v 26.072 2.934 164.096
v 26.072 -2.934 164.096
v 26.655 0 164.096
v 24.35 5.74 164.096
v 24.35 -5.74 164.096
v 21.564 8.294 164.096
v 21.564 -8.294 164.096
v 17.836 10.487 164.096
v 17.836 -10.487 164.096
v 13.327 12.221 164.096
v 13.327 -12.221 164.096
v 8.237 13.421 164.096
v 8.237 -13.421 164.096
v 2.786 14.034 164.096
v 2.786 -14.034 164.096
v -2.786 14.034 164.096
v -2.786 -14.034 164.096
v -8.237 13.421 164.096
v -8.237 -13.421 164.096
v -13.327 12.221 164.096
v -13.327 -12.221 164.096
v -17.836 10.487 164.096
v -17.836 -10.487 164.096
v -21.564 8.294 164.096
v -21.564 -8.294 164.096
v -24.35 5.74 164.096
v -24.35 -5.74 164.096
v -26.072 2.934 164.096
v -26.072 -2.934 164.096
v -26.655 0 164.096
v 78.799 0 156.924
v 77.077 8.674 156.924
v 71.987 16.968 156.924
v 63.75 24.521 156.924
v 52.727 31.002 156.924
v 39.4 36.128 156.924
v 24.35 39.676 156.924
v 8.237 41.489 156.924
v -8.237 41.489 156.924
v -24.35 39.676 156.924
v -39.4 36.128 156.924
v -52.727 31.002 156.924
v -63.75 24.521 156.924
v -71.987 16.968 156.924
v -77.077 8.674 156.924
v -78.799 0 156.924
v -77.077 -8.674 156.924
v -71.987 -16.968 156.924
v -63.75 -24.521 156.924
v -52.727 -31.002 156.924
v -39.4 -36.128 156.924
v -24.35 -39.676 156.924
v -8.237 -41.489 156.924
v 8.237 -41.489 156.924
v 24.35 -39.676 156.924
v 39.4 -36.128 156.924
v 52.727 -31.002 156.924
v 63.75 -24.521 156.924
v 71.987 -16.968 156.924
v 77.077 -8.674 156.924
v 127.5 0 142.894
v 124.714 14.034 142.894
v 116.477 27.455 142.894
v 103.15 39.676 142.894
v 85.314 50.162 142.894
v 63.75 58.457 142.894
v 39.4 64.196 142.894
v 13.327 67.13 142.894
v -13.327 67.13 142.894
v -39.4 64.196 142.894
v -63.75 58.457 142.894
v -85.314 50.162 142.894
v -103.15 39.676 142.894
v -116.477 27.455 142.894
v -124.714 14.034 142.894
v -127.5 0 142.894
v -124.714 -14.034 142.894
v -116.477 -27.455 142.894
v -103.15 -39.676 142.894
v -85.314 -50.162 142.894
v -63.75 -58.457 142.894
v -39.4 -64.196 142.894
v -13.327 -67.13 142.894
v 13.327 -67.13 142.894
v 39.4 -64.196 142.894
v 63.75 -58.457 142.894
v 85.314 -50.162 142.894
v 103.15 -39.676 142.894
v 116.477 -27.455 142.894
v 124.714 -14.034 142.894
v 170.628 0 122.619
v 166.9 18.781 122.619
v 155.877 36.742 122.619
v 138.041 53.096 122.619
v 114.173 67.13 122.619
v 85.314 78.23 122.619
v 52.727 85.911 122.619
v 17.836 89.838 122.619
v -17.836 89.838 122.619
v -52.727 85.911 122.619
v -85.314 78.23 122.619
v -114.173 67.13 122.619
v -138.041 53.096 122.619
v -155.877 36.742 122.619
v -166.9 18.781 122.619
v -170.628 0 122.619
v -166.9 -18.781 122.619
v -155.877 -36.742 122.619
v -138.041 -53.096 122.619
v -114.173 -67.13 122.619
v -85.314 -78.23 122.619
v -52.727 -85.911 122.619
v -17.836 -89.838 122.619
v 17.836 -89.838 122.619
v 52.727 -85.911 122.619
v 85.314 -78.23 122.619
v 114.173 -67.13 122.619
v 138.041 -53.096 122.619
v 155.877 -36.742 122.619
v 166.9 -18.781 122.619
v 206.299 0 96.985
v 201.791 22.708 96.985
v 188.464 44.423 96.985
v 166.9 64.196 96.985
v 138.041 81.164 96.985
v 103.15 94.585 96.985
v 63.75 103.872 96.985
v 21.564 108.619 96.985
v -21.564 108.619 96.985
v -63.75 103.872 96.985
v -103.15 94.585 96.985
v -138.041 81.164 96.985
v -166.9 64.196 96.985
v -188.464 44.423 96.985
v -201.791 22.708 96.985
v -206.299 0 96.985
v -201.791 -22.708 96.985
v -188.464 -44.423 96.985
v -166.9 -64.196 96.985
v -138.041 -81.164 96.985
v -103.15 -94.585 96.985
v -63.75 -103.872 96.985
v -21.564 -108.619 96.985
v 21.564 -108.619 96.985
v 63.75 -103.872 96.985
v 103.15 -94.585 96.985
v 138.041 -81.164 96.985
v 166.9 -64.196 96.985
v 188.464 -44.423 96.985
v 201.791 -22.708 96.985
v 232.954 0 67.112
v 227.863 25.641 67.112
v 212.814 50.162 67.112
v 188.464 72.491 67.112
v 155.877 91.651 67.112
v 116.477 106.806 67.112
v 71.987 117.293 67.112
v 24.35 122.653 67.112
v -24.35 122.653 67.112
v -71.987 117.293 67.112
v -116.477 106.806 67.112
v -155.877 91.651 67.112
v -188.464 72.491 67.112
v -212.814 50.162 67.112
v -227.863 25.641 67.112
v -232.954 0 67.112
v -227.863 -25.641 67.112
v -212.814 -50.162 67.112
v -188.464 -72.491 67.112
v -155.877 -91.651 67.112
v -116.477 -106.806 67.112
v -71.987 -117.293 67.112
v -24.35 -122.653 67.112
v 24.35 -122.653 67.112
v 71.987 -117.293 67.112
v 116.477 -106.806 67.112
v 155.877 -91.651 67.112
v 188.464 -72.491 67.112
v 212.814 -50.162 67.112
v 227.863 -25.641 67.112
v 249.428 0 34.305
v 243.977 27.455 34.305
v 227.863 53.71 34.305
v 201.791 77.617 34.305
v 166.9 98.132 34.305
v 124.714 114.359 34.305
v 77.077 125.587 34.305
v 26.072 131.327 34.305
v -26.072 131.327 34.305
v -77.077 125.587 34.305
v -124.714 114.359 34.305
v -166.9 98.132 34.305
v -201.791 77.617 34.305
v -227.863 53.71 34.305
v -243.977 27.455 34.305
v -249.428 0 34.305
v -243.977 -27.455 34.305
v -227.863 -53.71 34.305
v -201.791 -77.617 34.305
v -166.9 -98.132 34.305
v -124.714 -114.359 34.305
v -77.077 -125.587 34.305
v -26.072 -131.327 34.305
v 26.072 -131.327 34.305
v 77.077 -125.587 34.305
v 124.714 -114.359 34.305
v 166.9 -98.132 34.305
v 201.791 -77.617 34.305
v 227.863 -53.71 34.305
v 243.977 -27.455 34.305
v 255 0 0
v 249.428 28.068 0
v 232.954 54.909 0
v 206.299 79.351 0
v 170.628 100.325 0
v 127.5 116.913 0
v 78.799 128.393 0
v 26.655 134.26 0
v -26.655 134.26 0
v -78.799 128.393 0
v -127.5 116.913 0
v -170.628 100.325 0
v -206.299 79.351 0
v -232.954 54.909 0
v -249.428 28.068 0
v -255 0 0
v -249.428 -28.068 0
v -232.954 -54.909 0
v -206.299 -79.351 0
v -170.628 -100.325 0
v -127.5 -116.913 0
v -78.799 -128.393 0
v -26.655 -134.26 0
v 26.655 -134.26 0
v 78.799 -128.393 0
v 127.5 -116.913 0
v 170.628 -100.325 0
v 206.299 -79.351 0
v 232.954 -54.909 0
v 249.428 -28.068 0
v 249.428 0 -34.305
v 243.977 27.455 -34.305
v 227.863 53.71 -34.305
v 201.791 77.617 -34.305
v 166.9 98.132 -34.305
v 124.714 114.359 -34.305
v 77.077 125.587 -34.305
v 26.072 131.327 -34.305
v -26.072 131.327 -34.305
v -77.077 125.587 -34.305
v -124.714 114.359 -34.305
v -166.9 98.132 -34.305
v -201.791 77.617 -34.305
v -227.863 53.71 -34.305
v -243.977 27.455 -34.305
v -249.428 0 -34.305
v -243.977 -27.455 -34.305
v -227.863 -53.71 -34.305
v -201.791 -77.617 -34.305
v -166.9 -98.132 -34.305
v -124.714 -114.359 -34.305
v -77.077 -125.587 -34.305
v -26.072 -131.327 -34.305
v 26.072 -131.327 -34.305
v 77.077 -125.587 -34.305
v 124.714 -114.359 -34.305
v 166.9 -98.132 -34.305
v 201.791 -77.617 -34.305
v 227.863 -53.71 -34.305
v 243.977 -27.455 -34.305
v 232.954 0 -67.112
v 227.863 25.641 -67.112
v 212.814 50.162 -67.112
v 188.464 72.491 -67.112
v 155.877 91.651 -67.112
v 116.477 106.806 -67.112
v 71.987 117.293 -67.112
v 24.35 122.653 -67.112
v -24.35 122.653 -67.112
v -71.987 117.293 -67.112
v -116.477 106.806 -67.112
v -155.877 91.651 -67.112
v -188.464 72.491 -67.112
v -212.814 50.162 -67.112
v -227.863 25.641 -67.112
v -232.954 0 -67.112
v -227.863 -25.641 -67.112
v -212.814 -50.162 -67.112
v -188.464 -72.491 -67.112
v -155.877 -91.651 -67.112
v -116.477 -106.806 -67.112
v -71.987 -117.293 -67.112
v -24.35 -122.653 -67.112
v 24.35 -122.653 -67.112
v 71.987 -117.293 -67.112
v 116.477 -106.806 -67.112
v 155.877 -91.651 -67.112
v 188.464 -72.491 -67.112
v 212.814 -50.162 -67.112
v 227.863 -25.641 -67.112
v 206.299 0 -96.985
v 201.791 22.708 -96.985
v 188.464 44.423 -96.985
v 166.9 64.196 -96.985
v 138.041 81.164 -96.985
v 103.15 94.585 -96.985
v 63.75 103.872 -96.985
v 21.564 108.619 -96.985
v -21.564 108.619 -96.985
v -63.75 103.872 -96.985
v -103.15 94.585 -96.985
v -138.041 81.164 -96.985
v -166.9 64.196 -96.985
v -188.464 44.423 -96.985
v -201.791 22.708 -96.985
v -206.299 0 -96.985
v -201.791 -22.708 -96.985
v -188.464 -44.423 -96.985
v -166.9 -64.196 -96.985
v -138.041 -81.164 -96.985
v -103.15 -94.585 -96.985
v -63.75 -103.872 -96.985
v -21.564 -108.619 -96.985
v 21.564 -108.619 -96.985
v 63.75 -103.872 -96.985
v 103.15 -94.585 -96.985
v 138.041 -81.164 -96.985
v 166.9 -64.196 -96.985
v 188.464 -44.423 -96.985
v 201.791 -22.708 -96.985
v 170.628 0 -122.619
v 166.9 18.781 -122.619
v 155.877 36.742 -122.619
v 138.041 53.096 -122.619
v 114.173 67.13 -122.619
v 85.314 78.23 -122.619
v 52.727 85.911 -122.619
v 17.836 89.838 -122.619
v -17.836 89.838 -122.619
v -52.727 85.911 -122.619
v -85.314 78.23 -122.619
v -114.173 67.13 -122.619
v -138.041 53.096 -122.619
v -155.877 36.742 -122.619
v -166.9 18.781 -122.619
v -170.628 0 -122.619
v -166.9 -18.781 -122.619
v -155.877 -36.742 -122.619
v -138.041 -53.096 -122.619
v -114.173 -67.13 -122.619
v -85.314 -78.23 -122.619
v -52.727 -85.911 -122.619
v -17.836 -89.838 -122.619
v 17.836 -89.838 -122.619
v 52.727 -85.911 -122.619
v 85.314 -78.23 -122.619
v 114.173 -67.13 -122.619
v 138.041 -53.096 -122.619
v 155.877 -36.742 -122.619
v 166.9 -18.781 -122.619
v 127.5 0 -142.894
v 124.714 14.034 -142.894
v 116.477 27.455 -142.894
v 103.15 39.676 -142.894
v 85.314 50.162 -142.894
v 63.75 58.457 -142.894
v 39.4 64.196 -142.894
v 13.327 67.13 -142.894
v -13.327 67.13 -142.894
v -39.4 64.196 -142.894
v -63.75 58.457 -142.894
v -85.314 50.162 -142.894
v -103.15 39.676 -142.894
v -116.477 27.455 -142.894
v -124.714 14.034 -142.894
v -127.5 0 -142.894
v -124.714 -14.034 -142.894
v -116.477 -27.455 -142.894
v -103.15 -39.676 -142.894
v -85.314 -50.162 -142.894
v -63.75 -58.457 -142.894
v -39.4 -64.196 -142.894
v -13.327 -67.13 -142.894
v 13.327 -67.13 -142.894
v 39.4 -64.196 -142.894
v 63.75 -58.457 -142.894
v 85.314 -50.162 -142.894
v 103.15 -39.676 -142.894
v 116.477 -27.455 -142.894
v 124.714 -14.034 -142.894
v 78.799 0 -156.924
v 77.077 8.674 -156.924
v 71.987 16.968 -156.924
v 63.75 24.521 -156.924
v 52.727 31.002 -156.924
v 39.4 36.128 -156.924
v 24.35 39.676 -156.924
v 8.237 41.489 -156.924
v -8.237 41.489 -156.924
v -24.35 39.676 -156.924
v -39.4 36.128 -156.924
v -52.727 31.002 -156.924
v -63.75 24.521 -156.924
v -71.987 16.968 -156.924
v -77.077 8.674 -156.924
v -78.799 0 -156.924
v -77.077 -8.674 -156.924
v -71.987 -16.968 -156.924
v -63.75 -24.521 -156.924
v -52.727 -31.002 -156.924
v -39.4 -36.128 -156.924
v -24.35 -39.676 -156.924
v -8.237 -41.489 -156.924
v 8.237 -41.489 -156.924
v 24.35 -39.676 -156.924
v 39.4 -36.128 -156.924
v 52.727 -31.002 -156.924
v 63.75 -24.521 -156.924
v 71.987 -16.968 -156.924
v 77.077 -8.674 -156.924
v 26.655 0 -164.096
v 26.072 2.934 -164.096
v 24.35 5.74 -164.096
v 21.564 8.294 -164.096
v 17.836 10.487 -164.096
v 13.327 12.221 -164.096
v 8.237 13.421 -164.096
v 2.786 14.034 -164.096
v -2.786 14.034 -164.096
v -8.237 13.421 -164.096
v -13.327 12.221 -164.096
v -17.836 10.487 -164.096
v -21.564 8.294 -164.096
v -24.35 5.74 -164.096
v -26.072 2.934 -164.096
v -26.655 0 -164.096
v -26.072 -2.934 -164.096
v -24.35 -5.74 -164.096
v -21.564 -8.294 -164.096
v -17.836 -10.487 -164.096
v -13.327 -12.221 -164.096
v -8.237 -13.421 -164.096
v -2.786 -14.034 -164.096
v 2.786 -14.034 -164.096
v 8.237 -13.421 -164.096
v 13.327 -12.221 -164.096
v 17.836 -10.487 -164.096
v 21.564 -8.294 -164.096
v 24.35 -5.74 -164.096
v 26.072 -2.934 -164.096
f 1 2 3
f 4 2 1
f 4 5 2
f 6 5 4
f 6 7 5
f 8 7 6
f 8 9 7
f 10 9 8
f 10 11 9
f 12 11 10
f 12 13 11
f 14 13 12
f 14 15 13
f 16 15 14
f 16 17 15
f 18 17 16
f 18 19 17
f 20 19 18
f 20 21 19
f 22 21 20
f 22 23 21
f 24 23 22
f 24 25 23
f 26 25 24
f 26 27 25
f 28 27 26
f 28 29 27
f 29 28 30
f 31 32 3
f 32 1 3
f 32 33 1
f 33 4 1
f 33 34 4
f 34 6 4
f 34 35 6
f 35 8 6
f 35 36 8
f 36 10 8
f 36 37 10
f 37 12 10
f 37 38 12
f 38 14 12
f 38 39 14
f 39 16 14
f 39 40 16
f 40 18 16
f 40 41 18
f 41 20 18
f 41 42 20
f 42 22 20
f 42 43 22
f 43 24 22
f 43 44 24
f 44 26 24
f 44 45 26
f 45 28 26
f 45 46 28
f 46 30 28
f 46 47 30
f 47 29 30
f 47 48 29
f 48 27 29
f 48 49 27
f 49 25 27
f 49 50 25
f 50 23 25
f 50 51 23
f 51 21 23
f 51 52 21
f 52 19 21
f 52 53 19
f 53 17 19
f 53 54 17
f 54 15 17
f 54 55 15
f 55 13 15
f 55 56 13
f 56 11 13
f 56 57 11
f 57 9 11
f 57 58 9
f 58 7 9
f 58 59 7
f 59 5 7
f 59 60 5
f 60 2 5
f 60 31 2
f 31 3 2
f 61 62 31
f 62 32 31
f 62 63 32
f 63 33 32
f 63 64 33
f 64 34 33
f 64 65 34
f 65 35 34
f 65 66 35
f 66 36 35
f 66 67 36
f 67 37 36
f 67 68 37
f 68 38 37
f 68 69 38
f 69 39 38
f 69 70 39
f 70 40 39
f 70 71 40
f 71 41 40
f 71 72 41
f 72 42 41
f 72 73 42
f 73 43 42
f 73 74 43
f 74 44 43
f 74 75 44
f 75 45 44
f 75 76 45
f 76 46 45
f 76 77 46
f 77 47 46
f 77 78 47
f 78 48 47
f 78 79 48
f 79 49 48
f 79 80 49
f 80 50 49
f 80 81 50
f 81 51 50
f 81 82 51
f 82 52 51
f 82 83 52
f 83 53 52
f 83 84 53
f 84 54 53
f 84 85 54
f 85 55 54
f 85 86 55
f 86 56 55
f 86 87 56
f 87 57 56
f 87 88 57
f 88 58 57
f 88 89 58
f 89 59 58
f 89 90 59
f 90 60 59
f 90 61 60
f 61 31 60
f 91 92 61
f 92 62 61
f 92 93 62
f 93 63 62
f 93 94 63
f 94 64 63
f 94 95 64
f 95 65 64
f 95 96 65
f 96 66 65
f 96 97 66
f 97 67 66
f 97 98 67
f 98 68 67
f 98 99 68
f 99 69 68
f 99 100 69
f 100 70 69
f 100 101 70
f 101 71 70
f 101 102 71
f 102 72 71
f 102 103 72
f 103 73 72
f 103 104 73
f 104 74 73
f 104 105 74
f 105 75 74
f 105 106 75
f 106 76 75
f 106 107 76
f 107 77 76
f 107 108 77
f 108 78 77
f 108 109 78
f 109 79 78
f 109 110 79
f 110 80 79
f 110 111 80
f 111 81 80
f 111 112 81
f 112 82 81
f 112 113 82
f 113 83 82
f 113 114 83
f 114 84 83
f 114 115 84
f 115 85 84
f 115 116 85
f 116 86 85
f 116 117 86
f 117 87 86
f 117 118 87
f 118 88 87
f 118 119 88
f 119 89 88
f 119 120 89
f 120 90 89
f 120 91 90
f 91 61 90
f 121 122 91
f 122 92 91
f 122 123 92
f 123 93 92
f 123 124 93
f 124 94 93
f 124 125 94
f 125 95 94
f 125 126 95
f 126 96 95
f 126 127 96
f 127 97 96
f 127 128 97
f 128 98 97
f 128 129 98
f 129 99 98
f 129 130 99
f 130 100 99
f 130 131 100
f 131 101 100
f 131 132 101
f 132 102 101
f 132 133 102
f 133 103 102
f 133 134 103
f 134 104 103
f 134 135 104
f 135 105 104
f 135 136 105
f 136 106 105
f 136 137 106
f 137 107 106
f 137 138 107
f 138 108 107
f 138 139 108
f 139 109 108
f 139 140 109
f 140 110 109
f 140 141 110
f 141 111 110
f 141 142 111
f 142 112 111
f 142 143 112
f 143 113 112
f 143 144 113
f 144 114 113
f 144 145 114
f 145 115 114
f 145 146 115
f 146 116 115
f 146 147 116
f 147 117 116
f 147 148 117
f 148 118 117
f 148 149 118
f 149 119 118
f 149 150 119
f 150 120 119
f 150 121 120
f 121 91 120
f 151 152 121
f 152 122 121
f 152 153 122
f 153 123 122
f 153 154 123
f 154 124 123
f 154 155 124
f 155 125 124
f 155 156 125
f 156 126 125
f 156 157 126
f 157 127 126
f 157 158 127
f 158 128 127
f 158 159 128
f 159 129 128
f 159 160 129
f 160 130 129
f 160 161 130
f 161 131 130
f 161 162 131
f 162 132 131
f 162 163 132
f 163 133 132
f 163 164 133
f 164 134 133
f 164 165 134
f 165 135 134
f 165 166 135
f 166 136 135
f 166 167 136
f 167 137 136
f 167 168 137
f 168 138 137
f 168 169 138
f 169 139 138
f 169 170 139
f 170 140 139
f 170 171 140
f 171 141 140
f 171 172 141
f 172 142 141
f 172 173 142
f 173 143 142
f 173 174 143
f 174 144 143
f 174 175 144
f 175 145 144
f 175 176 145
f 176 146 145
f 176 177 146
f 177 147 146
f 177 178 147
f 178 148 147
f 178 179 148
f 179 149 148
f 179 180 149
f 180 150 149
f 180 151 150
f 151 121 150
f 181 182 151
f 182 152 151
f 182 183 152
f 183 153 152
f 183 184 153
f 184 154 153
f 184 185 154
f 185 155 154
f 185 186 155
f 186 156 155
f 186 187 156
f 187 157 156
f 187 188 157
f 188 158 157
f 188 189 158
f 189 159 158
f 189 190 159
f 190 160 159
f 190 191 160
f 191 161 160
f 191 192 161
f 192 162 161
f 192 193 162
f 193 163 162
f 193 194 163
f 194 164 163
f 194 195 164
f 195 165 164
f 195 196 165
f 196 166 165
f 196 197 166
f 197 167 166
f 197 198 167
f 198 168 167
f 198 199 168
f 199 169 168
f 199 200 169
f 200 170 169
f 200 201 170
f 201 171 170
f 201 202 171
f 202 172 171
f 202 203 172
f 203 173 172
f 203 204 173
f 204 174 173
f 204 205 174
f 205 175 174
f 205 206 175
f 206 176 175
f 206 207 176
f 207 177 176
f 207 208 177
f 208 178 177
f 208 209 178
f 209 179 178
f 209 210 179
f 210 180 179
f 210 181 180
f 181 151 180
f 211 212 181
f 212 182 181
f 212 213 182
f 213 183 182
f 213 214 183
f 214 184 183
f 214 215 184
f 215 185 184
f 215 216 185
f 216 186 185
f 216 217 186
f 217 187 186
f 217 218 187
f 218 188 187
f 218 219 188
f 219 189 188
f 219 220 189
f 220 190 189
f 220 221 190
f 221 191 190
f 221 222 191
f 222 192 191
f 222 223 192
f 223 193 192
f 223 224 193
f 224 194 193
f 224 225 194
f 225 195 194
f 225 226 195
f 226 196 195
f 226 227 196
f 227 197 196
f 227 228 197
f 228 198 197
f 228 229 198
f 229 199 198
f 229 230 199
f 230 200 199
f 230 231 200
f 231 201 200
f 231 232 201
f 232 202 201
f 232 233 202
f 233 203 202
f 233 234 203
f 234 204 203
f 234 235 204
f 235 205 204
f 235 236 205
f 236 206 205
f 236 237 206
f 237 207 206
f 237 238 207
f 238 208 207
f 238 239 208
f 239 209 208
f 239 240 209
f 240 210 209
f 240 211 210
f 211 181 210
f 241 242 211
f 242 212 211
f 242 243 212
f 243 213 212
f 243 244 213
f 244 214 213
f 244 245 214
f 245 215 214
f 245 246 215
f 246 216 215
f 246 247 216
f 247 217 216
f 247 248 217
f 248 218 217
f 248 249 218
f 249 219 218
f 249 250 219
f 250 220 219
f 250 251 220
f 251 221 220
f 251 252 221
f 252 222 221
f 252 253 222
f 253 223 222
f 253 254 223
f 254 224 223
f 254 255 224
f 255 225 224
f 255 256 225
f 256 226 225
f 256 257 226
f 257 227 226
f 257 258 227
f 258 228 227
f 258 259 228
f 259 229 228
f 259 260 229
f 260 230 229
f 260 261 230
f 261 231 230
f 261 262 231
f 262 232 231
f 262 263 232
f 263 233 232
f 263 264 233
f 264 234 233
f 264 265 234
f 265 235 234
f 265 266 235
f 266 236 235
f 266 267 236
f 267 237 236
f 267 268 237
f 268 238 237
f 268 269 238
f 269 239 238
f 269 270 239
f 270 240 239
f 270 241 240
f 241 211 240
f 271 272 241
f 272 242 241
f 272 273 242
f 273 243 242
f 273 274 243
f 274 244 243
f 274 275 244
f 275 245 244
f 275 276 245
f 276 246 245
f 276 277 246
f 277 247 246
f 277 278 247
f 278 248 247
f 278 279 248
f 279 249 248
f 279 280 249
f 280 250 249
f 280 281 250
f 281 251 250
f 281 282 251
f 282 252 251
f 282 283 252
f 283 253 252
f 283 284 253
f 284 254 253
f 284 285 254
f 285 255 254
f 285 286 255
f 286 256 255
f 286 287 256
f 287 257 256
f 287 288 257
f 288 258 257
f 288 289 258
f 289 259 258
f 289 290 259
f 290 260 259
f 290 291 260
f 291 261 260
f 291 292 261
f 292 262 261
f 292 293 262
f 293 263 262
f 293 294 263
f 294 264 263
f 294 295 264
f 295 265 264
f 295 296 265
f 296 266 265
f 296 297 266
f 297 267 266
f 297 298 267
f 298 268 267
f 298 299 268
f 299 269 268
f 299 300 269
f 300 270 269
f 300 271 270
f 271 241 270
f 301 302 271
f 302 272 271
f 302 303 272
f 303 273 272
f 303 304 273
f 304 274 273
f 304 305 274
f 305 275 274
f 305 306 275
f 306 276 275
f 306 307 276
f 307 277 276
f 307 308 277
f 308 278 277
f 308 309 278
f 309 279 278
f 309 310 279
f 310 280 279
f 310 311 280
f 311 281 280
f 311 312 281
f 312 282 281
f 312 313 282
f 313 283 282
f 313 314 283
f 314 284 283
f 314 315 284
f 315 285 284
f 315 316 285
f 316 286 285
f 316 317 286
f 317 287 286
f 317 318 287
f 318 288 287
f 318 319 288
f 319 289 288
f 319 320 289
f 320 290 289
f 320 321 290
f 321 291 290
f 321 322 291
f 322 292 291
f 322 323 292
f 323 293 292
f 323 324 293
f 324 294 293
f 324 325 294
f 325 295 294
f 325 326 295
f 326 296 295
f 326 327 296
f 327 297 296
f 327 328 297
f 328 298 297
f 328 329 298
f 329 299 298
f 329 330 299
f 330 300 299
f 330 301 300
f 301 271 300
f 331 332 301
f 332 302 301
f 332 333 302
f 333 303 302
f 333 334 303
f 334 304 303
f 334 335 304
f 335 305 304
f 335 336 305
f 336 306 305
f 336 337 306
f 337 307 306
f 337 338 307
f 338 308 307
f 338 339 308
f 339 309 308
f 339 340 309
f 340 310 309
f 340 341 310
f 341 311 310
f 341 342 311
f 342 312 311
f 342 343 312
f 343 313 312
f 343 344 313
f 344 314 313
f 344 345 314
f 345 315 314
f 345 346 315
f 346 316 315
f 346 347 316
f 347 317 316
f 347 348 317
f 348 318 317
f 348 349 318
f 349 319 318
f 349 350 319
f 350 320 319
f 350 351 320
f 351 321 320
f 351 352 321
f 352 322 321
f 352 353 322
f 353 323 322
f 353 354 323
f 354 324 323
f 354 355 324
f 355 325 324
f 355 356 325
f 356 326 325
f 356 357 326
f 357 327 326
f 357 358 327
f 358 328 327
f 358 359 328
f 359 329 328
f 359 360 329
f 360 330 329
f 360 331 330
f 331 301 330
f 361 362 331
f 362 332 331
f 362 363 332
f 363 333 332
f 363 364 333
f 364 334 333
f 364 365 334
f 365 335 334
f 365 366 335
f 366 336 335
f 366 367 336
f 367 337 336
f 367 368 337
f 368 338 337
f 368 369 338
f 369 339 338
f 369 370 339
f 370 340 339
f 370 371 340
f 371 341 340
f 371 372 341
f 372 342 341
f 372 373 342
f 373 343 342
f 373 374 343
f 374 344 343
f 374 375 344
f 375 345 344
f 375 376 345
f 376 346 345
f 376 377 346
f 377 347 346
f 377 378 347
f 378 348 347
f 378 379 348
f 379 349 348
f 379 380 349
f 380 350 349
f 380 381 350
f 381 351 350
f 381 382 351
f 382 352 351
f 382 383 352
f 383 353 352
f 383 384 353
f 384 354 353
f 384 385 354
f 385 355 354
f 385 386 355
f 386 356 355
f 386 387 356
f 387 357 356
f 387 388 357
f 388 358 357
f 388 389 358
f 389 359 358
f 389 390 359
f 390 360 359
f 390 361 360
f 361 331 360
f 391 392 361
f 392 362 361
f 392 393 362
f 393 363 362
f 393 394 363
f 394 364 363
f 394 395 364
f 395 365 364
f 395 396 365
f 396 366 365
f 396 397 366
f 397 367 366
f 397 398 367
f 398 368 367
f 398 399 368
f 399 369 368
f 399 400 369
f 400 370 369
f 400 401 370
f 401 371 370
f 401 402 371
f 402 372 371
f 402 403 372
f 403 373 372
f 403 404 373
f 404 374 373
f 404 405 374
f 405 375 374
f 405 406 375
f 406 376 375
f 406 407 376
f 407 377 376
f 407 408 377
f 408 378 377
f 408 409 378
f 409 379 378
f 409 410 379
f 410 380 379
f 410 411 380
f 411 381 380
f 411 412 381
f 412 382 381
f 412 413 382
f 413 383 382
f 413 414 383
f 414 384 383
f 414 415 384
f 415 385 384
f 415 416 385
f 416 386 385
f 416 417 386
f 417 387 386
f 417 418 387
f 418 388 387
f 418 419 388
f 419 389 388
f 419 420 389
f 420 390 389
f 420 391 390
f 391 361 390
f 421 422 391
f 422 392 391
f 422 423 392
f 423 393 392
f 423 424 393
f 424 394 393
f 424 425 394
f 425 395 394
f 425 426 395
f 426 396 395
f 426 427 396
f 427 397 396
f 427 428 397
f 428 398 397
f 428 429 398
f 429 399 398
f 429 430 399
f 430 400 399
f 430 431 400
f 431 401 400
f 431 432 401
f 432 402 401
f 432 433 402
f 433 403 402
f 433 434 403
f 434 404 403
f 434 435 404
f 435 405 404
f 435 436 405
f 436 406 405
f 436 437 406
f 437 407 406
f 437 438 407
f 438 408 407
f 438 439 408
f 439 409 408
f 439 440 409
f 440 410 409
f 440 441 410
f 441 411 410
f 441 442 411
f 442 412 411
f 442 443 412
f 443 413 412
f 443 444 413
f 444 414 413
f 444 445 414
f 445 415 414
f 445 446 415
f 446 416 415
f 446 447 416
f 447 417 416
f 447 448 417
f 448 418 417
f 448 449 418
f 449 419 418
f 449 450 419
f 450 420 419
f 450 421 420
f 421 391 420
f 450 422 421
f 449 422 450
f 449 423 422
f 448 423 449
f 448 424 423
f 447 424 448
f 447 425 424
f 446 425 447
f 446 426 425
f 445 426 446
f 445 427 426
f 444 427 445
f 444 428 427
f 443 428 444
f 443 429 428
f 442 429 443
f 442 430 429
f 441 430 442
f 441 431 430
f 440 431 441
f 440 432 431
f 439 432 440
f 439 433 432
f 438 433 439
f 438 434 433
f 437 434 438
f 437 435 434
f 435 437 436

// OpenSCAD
// Generated by SolidPython 1.0.1 on 2020-07-29 00:46:53


scale(v = [17, 9, 11]) {
	sphere(r = 15);
}
/***********************************************
*********      SolidPython code:      **********
************************************************
 
# import packages: SolidPython
from solid import *
from solid.utils import *
from itertools import chain, combinations, permutations


class Resize:

    def __init__(self, scad_file):
        self.scad_file = scad_file
        #self.scad_file = import_scad(scad_file)
        # cone/cylinder param:
        self.r1 = 0
        self.r2 = 0
        self.h = 0
        # rectangular prism param:
        self.w = 0
        self.l = 0
        # ellipse param:
        self.r = 0

    # import OpenScad code (file name corresponds to shape)


    # classify shape + parameters
    def assign(self, param1, param2, param3):
        if self.scad_file == 'cone.scad':
            self.r1 = param1
            self.r2 = param2
            self.h = param3
        elif self.scad_file == 'cylinder.scad':
            self.r1 = param1
            self.r2 = param2
            self.h = param3
        elif self.scad_file == 'rectangularPrism.scad':
            self.h = param1
            self.l = param2
            self.w = param3
        else:
            self.r = param1
            self.h = param2

    # resize parameters
    def iterate(self):
        x = range(3, 20, 2)
        i = 1
        if self.scad_file == 'cone.scad':
            tempList = list(permutations(x, 2))
            for temp in tempList:
                param1 = temp[0]
                param2 = temp[1]
                filepath = 'produced_scad_files/' + 'cone' + str(param1) + '_' + str(param2) + '_' + '.scad'
                scad_render_to_file(cylinder(h=param1, r1=param2, r2=0), filepath)

        elif self.scad_file == 'cylinder.scad':
            tempList = list(permutations(x, 3))
            for temp in tempList:
                param1 = temp[0]
                param2 = temp[1]
                filepath = 'produced_scad_files/' + 'cylinder' + str(param1) + '_' + str(param2) + '_' + '.scad'
                scad_render_to_file(cylinder(h=param1, r1=param2, r2=param2), filepath)

        elif self.scad_file == 'rectangularPrism.scad':
            tempList = list(permutations(x, 3))
            for temp in tempList:
                param1 = temp[0]
                param2 = temp[1]
                param3 = temp[2]
                filepath = 'produced_scad_files/' + 'rectangularPrism' + str(param1) + '_' + str(param2) + '_' + str(
                    param3) + '.scad'
                scad_render_to_file(cube(size=(param1, param2, param3)), filepath)

        elif self.scad_file == 'ellipse.scad':
            tempList = list(permutations(x, 4))
            for temp in tempList:
                param1 = temp[0]
                param2 = temp[1]
                param3 = temp[2]
                param4 = temp[3]
                filepath = 'produced_scad_files/' + 'ellipse' + str(param1) + '_' + str(param2) + '_' + str(param3) + '_' + str(param4) + '.scad'
                scad_render_to_file(scale([param1, param2, param3])(sphere(r=param4)), filepath)

    def render_to_scadfile(self):
        scad_render_to_file(scad, 'example.scad') 
 
************************************************/
